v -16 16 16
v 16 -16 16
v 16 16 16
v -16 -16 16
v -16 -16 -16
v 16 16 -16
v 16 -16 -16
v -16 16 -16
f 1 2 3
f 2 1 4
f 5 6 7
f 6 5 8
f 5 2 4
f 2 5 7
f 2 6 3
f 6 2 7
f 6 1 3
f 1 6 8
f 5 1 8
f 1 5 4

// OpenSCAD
size = 32;//block=32 //item=8



cube([size * 1, size * 1, size * 1], center = true);
